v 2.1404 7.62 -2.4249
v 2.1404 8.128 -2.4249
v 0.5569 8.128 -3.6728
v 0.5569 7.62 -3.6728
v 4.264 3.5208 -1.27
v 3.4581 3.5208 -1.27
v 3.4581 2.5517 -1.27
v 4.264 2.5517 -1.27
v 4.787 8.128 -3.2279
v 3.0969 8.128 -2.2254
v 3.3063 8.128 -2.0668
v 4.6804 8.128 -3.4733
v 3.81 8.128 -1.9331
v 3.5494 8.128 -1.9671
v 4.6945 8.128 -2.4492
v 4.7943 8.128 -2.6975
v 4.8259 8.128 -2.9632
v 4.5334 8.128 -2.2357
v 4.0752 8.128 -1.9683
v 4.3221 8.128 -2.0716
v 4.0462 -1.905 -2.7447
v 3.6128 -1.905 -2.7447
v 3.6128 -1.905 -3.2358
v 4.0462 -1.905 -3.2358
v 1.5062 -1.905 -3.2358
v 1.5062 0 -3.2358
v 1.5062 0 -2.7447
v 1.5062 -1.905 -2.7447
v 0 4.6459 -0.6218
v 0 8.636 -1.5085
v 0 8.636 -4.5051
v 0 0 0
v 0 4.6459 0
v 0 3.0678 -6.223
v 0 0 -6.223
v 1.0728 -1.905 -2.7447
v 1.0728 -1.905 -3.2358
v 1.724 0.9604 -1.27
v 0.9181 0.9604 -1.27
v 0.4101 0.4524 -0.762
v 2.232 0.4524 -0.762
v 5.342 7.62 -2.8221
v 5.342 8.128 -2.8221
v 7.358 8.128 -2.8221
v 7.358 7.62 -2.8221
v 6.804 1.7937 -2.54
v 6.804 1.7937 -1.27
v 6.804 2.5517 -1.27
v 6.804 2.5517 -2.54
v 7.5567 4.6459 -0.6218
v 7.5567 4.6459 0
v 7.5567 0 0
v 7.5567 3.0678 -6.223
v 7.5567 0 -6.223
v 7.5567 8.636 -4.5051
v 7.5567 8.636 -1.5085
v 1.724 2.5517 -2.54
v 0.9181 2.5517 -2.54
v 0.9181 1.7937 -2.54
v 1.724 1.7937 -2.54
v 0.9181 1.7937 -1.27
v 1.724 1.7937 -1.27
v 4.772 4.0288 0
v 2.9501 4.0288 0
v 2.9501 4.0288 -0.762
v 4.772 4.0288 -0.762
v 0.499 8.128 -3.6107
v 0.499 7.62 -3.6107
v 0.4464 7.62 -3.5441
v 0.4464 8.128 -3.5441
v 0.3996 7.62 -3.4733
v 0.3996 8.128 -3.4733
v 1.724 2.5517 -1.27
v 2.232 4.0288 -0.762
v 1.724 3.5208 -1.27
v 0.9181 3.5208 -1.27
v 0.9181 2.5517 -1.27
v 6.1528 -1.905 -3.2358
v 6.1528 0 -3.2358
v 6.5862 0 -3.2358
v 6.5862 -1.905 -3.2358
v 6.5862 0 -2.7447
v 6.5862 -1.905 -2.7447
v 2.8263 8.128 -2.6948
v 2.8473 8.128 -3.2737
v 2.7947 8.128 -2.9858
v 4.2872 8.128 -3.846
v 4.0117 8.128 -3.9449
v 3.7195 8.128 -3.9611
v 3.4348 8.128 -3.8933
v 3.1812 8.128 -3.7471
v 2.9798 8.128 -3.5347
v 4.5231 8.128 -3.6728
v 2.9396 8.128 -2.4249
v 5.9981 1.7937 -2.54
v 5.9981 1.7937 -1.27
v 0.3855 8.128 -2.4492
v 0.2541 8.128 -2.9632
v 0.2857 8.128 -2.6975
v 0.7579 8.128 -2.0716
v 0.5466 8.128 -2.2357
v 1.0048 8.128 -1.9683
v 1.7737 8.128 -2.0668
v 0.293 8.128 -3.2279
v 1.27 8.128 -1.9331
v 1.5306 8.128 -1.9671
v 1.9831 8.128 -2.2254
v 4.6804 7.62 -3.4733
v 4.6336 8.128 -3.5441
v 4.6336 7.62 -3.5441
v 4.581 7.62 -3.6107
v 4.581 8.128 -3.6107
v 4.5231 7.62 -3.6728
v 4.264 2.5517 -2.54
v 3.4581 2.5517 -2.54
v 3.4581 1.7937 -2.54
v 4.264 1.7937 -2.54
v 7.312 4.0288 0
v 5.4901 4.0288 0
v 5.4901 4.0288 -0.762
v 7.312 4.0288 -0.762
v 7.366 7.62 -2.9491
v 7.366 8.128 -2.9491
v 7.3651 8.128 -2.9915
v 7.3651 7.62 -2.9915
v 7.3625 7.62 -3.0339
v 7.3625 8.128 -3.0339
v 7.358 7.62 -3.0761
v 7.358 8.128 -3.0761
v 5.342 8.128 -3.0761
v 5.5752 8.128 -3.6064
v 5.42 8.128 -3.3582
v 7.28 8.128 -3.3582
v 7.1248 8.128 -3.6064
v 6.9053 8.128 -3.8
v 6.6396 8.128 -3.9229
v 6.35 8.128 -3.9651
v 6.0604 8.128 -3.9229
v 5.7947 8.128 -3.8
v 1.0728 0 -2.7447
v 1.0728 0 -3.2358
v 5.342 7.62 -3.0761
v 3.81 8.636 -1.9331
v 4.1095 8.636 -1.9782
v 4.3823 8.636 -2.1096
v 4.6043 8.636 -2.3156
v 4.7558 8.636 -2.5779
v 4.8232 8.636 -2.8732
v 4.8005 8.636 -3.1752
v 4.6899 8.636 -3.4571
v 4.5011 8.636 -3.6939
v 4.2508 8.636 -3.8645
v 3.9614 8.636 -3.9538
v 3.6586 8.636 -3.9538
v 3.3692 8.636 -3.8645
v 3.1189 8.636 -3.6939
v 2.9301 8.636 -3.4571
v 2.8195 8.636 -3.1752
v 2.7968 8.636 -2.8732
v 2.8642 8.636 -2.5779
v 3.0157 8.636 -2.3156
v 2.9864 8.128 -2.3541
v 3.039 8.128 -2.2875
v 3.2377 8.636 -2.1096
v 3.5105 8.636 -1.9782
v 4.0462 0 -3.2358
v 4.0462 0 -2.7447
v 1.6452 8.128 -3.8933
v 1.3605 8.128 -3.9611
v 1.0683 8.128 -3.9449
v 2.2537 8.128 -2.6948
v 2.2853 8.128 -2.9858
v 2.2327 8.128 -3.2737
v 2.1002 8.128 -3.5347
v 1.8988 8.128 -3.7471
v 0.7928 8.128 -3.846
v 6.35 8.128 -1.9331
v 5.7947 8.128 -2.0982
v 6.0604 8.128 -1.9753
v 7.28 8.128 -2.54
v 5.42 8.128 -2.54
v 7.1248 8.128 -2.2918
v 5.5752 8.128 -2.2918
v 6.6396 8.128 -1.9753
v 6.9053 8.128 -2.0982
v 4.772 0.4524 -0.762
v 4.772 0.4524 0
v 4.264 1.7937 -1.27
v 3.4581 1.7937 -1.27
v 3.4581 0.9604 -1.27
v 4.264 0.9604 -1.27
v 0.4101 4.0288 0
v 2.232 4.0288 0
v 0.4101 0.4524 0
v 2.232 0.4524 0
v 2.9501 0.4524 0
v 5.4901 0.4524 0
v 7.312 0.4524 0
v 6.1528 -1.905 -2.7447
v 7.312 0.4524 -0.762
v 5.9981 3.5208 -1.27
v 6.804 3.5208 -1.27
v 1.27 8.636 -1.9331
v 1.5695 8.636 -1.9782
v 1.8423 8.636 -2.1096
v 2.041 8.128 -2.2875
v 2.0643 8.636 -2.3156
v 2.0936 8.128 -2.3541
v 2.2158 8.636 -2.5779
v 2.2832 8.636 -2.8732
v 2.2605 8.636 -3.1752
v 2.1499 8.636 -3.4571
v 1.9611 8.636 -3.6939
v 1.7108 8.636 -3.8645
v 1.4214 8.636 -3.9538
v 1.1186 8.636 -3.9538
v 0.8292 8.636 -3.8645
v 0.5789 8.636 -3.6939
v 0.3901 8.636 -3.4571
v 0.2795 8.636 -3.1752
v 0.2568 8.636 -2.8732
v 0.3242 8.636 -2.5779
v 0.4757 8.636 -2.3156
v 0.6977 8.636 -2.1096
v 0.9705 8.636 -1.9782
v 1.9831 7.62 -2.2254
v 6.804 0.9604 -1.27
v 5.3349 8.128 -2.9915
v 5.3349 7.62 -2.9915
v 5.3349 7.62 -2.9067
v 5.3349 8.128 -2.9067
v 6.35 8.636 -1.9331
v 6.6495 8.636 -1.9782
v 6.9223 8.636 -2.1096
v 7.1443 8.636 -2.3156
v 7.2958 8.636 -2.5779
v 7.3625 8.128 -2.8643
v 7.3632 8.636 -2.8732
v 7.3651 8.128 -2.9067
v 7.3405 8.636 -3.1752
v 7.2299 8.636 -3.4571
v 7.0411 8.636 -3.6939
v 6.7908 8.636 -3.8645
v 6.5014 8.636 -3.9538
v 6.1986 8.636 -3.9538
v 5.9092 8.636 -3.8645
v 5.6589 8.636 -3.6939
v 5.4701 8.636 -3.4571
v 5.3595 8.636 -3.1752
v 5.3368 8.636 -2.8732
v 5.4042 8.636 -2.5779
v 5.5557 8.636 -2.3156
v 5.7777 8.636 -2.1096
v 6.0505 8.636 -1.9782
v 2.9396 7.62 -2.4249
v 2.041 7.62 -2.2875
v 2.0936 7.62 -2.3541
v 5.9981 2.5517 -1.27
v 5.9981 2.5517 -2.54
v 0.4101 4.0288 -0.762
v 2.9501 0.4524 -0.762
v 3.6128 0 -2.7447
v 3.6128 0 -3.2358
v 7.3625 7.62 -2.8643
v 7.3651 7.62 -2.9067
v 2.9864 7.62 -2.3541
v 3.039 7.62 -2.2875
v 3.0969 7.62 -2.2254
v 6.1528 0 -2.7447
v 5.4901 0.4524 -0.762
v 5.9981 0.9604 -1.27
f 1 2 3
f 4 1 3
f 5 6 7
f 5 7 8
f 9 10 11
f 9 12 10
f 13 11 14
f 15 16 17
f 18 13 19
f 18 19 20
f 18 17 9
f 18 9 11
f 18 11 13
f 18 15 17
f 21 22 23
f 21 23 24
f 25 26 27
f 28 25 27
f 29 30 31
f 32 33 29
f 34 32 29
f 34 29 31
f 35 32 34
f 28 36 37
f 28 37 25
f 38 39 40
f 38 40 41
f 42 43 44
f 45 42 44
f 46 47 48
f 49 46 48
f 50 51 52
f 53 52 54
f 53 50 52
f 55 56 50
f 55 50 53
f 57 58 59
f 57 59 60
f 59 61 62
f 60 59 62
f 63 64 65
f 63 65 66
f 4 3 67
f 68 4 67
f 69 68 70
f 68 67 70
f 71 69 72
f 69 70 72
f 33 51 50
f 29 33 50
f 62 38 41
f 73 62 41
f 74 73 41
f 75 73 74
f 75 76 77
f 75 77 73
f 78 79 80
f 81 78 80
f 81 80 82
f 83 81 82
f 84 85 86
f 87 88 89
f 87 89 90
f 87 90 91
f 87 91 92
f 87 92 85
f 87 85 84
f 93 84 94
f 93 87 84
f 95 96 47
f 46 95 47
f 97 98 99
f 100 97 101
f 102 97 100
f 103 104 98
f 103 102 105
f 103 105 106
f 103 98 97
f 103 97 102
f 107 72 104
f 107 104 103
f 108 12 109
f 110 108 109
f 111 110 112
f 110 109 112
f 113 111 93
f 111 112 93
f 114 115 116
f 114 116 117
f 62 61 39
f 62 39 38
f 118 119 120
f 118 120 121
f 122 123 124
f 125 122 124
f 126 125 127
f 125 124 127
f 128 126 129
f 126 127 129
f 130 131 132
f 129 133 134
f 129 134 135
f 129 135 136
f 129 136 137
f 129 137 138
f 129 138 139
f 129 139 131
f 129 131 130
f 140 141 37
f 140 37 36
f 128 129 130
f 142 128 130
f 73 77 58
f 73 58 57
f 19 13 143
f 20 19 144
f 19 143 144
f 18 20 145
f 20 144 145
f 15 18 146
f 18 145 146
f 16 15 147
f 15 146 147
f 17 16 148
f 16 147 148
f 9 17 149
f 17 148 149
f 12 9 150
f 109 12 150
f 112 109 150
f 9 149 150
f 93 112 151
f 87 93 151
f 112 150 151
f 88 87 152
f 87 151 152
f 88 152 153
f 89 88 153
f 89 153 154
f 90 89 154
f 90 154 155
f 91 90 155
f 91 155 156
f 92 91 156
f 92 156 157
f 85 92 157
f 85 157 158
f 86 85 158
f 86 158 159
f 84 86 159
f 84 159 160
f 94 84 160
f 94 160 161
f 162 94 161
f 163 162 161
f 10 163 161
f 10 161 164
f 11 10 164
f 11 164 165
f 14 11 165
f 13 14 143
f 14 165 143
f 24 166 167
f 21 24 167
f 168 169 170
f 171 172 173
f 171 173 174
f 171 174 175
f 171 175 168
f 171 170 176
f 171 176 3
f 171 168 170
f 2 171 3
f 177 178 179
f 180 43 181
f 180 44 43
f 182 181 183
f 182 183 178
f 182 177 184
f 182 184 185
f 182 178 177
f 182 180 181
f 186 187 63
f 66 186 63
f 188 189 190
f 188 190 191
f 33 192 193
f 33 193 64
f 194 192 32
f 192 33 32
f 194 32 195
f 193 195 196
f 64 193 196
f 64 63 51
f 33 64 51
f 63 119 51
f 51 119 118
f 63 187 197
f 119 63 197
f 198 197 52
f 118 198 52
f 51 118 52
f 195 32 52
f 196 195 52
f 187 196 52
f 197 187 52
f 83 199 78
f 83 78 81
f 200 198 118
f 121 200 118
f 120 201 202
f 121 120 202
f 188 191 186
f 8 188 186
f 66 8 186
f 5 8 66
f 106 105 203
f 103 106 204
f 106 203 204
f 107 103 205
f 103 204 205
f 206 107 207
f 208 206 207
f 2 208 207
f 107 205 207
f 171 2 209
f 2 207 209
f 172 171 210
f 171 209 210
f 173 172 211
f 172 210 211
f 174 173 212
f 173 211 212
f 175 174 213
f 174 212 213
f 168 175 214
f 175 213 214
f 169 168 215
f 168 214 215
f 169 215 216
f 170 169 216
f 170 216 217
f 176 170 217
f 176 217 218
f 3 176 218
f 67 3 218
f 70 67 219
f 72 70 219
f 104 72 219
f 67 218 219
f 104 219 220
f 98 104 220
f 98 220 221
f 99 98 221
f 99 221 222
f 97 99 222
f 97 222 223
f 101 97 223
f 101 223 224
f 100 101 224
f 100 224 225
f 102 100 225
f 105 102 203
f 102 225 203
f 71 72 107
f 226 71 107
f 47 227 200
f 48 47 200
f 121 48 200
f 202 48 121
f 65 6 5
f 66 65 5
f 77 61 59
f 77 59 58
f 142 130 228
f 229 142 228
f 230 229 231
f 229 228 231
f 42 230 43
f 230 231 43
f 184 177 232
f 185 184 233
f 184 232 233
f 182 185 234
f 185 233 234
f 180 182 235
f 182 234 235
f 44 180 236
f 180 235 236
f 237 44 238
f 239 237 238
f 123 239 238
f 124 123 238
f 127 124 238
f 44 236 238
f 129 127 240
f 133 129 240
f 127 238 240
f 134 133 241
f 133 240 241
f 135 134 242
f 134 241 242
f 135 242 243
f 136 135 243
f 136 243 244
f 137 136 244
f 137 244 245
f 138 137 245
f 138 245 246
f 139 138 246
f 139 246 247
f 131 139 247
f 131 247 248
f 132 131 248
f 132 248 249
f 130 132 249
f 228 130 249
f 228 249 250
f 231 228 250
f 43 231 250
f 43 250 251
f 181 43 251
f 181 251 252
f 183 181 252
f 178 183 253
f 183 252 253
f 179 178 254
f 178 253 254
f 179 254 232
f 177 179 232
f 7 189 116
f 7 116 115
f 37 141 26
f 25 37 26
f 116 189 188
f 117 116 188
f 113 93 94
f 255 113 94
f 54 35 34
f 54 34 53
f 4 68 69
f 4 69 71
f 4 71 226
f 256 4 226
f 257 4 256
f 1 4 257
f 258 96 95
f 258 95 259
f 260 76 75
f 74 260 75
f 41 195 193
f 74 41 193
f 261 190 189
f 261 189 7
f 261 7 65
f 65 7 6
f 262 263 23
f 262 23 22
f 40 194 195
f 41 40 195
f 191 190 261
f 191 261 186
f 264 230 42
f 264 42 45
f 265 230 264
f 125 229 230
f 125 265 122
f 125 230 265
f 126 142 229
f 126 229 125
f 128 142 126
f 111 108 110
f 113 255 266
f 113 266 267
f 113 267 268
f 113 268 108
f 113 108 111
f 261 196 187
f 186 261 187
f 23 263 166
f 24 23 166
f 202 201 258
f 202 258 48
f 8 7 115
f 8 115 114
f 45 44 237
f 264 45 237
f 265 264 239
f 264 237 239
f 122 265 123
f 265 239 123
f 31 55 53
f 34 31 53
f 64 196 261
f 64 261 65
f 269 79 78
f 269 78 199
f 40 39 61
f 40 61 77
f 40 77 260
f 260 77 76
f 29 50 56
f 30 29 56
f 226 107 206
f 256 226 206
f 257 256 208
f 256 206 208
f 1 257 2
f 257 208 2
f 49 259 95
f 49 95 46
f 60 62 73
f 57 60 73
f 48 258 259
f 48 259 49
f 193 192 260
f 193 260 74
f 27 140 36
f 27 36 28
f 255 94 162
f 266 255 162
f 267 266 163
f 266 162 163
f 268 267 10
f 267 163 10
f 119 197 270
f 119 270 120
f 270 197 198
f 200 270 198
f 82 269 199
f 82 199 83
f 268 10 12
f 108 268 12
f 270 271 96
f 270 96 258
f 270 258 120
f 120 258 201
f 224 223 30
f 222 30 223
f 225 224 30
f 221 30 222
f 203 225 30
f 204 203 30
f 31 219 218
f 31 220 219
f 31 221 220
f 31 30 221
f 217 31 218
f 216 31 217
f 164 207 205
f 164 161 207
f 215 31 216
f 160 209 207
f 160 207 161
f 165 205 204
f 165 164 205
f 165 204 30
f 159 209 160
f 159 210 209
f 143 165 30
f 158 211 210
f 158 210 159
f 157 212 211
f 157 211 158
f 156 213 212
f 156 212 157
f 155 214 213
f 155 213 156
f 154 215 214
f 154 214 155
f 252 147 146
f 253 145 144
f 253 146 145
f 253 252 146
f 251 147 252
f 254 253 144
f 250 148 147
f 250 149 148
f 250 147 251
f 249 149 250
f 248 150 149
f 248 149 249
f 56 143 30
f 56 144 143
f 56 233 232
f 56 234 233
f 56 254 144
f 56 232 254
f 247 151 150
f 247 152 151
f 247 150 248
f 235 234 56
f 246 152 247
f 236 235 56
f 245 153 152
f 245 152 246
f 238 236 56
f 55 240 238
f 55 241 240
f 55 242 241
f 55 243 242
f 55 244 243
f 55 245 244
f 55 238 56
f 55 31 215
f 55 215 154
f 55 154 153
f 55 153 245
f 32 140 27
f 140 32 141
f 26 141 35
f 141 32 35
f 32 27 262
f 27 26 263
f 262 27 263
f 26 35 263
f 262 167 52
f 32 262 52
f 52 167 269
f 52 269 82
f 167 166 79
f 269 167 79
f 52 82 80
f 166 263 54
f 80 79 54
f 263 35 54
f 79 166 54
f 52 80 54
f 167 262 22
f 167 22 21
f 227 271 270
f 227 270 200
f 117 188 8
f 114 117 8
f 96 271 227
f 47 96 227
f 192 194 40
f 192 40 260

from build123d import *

# Parameters (mm, degrees)
SKETCH1_W          = 20.701
SKETCH1_H          = 6.223
EXTRUDE1_DEPTH     = 8.636
CUT_EXTRUDE1_DEPTH = 25.4
CUT_EXTRUDE2_DEPTH = 25.4
SKETCH4_R          = 1.016
CUT_EXTRUDE3_DEPTH = 0.508
CUT_EXTRUDE4_DEPTH = 0.508
SKETCH6_W          = 1.82195604
SKETCH6_H          = 3.576432228
CUT_EXTRUDE5_DEPTH = 1.27
CHAMFER1_SIZE      = 0.508
SKETCH7_W          = 0.80595604
SKETCH7_H          = 0.757943843
CUT_EXTRUDE6_DEPTH = 1.27
SKETCH8_W          = 0.433382436
SKETCH8_H          = 0.491166761
EXTRUDE2_DEPTH     = 1.905
SKETCH9_W          = 13.835725518
SKETCH9_H          = 11.068580414
CUT_EXTRUDE7_DEPTH = 25.4


with BuildPart() as part:
    # Sketch1 → Extrude1 (new body)
    with BuildSketch(Plane(origin=(0, 0, 0), x_dir=(1, 0, 0), z_dir=(0, 1, 0))):
        with Locations((10.3505, 3.1115)):
            Rectangle(SKETCH1_W, SKETCH1_H)
    extrude(amount=EXTRUDE1_DEPTH)

    # Sketch2 → Cut-Extrude1 (cut)
    with BuildSketch(Plane(origin=(20.701, 0, 0), x_dir=(0, 0, -1), z_dir=(1, 0, 0))):
        Polygon((-2.869110069, 4.645946632), (0.62179162, 4.645946632), (2.217632392, 11.827230107), (-2.869110069, 11.827230107), align=None)
    extrude(amount=-CUT_EXTRUDE1_DEPTH, mode=Mode.SUBTRACT)

    # Sketch3 → Cut-Extrude2 (cut)
    with BuildSketch(Plane(origin=(20.701, 0, 0), x_dir=(0, 0, -1), z_dir=(1, 0, 0))):
        Polygon((4.012953261, 10.231389335), (6.905414661, 0.855824797), (9.199435771, 0.855824797), (9.199435771, 10.231389335), align=None)
    extrude(amount=-CUT_EXTRUDE2_DEPTH, mode=Mode.SUBTRACT)

    # Sketch4 → Cut-Extrude3 (cut)
    with BuildSketch(Plane(origin=(0, 8.636, 0), x_dir=(1, 0, 0), z_dir=(0, 1, 0))):
        with Locations(Location((1.27, 2.949100672, 0), (0, 0, 270))):
            Circle(SKETCH4_R)
        with Locations(Location((3.81, 2.949100672, 0), (0, 0, 270))):
            Circle(SKETCH4_R)
        with Locations(Location((6.35, 2.949100672, 0), (0, 0, 270))):
            Circle(SKETCH4_R)
        with Locations(Location((8.89, 2.949100672, 0), (0, 0, 270))):
            Circle(SKETCH4_R)
        with Locations(Location((11.43, 2.949100672, 0), (0, 0, 270))):
            Circle(SKETCH4_R)
        with Locations(Location((13.97, 2.949100672, 0), (0, 0, 270))):
            Circle(SKETCH4_R)
        with Locations(Location((16.51, 2.949100672, 0), (0, 0, 270))):
            Circle(SKETCH4_R)
        with Locations(Location((19.05, 2.949100672, 0), (0, 0, 270))):
            Circle(SKETCH4_R)
    extrude(amount=-CUT_EXTRUDE3_DEPTH, mode=Mode.SUBTRACT)

    # Sketch5 → Cut-Extrude4 (cut)
    with BuildSketch(Plane(origin=(0, 8.128, 0), x_dir=(1, 0, 0), z_dir=(0, 1, 0))):
        with BuildLine():
            ThreePointArc((0.55685802, 3.67276117), (0.471993814, 3.577942566), (0.399647546, 3.473259623))
            Line((0.399647546, 3.473259623), (1.98314198, 2.225440174))
            ThreePointArc((1.98314198, 2.225440174), (2.068006186, 2.320258778), (2.140352454, 2.42494172))
            Line((2.140352454, 2.42494172), (0.55685802, 3.67276117))
        make_face()
        with BuildLine():
            ThreePointArc((2.939647546, 2.42494172), (3.011993814, 2.320258778), (3.09685802, 2.225440174))
            Line((3.09685802, 2.225440174), (4.680352454, 3.473259623))
            ThreePointArc((4.680352454, 3.473259623), (4.608006186, 3.577942566), (4.52314198, 3.67276117))
            Line((4.52314198, 3.67276117), (2.939647546, 2.42494172))
        make_face()
        with BuildLine():
            ThreePointArc((5.34196875, 3.076100672), (5.334, 2.949100672), (5.34196875, 2.822100672))
            Line((5.34196875, 2.822100672), (7.35803125, 2.822100672))
            ThreePointArc((7.35803125, 2.822100672), (7.364005855, 2.885475793), (7.366, 2.949100672))
            ThreePointArc((7.366, 2.949100672), (7.364005855, 3.012725551), (7.35803125, 3.076100672))
            Line((7.35803125, 3.076100672), (5.34196875, 3.076100672))
        make_face()
        with BuildLine():
            ThreePointArc((8.458529789, 2.041483422), (8.576688012, 1.994233554), (8.699870069, 1.9622946))
            Line((8.699870069, 1.9622946), (9.321470211, 3.856717921))
            ThreePointArc((9.321470211, 3.856717921), (9.203311988, 3.90396779), (9.080129931, 3.935906744))
            Line((9.080129931, 3.935906744), (8.458529789, 2.041483422))
        make_face()
        with BuildLine():
            ThreePointArc((11.557, 3.957131921), (11.43, 3.965100672), (11.303, 3.957131921))
            Line((11.303, 3.957131921), (11.303, 1.941069422))
            ThreePointArc((11.303, 1.941069422), (11.43, 1.933100672), (11.557, 1.941069422))
            Line((11.557, 1.941069422), (11.557, 3.957131921))
        make_face()
        with BuildLine():
            ThreePointArc((13.060727808, 3.402399778), (13.011197076, 3.285185412), (12.976706622, 3.162699047))
            Line((12.976706622, 3.162699047), (14.879272192, 2.495801565))
            ThreePointArc((14.879272192, 2.495801565), (14.928802924, 2.613015931), (14.963293378, 2.735502296))
            Line((14.963293378, 2.735502296), (13.060727808, 3.402399778))
        make_face()
        with BuildLine():
            ThreePointArc((16.944941036, 3.867295801), (16.826755289, 3.914461789), (16.703600756, 3.946484624))
            Line((16.703600756, 3.946484624), (16.075058964, 2.030905542))
            ThreePointArc((16.075058964, 2.030905542), (16.193244711, 1.983739555), (16.316399244, 1.95171672))
            Line((16.316399244, 1.95171672), (16.944941036, 3.867295801))
        make_face()
        with BuildLine():
            ThreePointArc((18.349819557, 3.662547267), (18.264852019, 3.567810091), (18.192609083, 3.463045721))
            Line((18.192609083, 3.463045721), (19.750180443, 2.235654077))
            ThreePointArc((19.750180443, 2.235654077), (19.835147981, 2.330391253), (19.907390917, 2.435155623))
            Line((19.907390917, 2.435155623), (18.349819557, 3.662547267))
        make_face()
    extrude(amount=-CUT_EXTRUDE4_DEPTH, mode=Mode.SUBTRACT)

    # Sketch6 → Cut-Extrude5 (cut)
    with BuildSketch(Plane.XY):
        with Locations((3.861070401, 2.24061075)):
            Rectangle(SKETCH6_W, SKETCH6_H)
        with Locations((1.321070401, 2.24061075)):
            Rectangle(SKETCH6_W, SKETCH6_H)
        with Locations((6.401070401, 2.24061075)):
            Rectangle(SKETCH6_W, SKETCH6_H)
        with Locations((8.941070401, 2.24061075)):
            Rectangle(SKETCH6_W, SKETCH6_H)
        with Locations((11.481070401, 2.24061075)):
            Rectangle(SKETCH6_W, SKETCH6_H)
        with Locations((14.021070401, 2.24061075)):
            Rectangle(SKETCH6_W, SKETCH6_H)
        with Locations((16.561070401, 2.24061075)):
            Rectangle(SKETCH6_W, SKETCH6_H)
        with Locations((19.101070401, 2.24061075)):
            Rectangle(SKETCH6_W, SKETCH6_H)
    extrude(amount=-CUT_EXTRUDE5_DEPTH, mode=Mode.SUBTRACT)

    # Chamfer1
    chamfer1_edges = [part.edges().sort_by_distance(p)[0] for p in [
        (0.410092381, 2.24061075, -1.27),
        (1.321070401, 4.028826864, -1.27),
        (2.232048421, 2.24061075, -1.27),
        (1.321070401, 0.452394636, -1.27),
        (3.861070401, 4.028826864, -1.27),
        (4.772048421, 2.24061075, -1.27),
        (3.861070401, 0.452394636, -1.27),
        (2.950092381, 2.24061075, -1.27),
        (6.401070401, 4.028826864, -1.27),
        (7.312048421, 2.24061075, -1.27),
        (6.401070401, 0.452394636, -1.27),
        (5.490092381, 2.24061075, -1.27),
        (8.941070401, 4.028826864, -1.27),
        (9.852048421, 2.24061075, -1.27),
        (8.941070401, 0.452394636, -1.27),
        (8.030092381, 2.24061075, -1.27),
        (11.481070401, 4.028826864, -1.27),
        (12.392048421, 2.24061075, -1.27),
        (11.481070401, 0.452394636, -1.27),
        (10.570092381, 2.24061075, -1.27),
        (14.021070401, 4.028826864, -1.27),
        (14.932048421, 2.24061075, -1.27),
        (14.021070401, 0.452394636, -1.27),
        (13.110092381, 2.24061075, -1.27),
        (16.561070401, 4.028826864, -1.27),
        (17.472048421, 2.24061075, -1.27),
        (16.561070401, 0.452394636, -1.27),
        (15.650092381, 2.24061075, -1.27),
        (19.101070401, 4.028826864, -1.27),
        (20.012048421, 2.24061075, -1.27),
        (19.101070401, 0.452394636, -1.27),
        (18.190092381, 2.24061075, -1.27),
    ]]
    chamfer(chamfer1_edges, length=CHAMFER1_SIZE)

    # Sketch7 → Cut-Extrude6 (cut)
    with BuildSketch(Plane.XY.offset(-1.27)):
        with Locations((1.321070401, 2.17271271)):
            Rectangle(SKETCH7_W, SKETCH7_H)
        with Locations((3.861070401, 2.17271271)):
            Rectangle(SKETCH7_W, SKETCH7_H)
        with Locations((6.401070401, 2.17271271)):
            Rectangle(SKETCH7_W, SKETCH7_H)
        with Locations((8.941070401, 2.17271271)):
            Rectangle(SKETCH7_W, SKETCH7_H)
        with Locations((11.481070401, 2.17271271)):
            Rectangle(SKETCH7_W, SKETCH7_H)
        with Locations((14.021070401, 2.17271271)):
            Rectangle(SKETCH7_W, SKETCH7_H)
        with Locations((16.561070401, 2.17271271)):
            Rectangle(SKETCH7_W, SKETCH7_H)
        with Locations((19.101070401, 2.17271271)):
            Rectangle(SKETCH7_W, SKETCH7_H)
    extrude(amount=-CUT_EXTRUDE6_DEPTH, mode=Mode.SUBTRACT)

    # Sketch8 → Extrude2 (add)
    with BuildSketch(Plane.XZ):
        with Locations((3.829530977, -2.990246105)):
            Rectangle(SKETCH8_W, SKETCH8_H)
        with Locations((1.289530977, -2.990246105)):
            Rectangle(SKETCH8_W, SKETCH8_H)
        with Locations((6.369530977, -2.990246105)):
            Rectangle(SKETCH8_W, SKETCH8_H)
        with Locations((8.909530977, -2.990246105)):
            Rectangle(SKETCH8_W, SKETCH8_H)
        with Locations((11.449530977, -2.990246105)):
            Rectangle(SKETCH8_W, SKETCH8_H)
        with Locations((13.989530977, -2.990246105)):
            Rectangle(SKETCH8_W, SKETCH8_H)
        with Locations((16.529530977, -2.990246105)):
            Rectangle(SKETCH8_W, SKETCH8_H)
        with Locations((19.069530977, -2.990246105)):
            Rectangle(SKETCH8_W, SKETCH8_H)
    extrude(amount=EXTRUDE2_DEPTH)

    # Sketch9 → Cut-Extrude7 (cut)
    with BuildSketch(Plane(origin=(0, 8.636, 0), x_dir=(1, 0, 0), z_dir=(0, 1, 0))):
        with Locations((14.474610491, 2.472928053)):
            Rectangle(SKETCH9_W, SKETCH9_H)
    extrude(amount=-CUT_EXTRUDE7_DEPTH, mode=Mode.SUBTRACT)


solid = part.part
